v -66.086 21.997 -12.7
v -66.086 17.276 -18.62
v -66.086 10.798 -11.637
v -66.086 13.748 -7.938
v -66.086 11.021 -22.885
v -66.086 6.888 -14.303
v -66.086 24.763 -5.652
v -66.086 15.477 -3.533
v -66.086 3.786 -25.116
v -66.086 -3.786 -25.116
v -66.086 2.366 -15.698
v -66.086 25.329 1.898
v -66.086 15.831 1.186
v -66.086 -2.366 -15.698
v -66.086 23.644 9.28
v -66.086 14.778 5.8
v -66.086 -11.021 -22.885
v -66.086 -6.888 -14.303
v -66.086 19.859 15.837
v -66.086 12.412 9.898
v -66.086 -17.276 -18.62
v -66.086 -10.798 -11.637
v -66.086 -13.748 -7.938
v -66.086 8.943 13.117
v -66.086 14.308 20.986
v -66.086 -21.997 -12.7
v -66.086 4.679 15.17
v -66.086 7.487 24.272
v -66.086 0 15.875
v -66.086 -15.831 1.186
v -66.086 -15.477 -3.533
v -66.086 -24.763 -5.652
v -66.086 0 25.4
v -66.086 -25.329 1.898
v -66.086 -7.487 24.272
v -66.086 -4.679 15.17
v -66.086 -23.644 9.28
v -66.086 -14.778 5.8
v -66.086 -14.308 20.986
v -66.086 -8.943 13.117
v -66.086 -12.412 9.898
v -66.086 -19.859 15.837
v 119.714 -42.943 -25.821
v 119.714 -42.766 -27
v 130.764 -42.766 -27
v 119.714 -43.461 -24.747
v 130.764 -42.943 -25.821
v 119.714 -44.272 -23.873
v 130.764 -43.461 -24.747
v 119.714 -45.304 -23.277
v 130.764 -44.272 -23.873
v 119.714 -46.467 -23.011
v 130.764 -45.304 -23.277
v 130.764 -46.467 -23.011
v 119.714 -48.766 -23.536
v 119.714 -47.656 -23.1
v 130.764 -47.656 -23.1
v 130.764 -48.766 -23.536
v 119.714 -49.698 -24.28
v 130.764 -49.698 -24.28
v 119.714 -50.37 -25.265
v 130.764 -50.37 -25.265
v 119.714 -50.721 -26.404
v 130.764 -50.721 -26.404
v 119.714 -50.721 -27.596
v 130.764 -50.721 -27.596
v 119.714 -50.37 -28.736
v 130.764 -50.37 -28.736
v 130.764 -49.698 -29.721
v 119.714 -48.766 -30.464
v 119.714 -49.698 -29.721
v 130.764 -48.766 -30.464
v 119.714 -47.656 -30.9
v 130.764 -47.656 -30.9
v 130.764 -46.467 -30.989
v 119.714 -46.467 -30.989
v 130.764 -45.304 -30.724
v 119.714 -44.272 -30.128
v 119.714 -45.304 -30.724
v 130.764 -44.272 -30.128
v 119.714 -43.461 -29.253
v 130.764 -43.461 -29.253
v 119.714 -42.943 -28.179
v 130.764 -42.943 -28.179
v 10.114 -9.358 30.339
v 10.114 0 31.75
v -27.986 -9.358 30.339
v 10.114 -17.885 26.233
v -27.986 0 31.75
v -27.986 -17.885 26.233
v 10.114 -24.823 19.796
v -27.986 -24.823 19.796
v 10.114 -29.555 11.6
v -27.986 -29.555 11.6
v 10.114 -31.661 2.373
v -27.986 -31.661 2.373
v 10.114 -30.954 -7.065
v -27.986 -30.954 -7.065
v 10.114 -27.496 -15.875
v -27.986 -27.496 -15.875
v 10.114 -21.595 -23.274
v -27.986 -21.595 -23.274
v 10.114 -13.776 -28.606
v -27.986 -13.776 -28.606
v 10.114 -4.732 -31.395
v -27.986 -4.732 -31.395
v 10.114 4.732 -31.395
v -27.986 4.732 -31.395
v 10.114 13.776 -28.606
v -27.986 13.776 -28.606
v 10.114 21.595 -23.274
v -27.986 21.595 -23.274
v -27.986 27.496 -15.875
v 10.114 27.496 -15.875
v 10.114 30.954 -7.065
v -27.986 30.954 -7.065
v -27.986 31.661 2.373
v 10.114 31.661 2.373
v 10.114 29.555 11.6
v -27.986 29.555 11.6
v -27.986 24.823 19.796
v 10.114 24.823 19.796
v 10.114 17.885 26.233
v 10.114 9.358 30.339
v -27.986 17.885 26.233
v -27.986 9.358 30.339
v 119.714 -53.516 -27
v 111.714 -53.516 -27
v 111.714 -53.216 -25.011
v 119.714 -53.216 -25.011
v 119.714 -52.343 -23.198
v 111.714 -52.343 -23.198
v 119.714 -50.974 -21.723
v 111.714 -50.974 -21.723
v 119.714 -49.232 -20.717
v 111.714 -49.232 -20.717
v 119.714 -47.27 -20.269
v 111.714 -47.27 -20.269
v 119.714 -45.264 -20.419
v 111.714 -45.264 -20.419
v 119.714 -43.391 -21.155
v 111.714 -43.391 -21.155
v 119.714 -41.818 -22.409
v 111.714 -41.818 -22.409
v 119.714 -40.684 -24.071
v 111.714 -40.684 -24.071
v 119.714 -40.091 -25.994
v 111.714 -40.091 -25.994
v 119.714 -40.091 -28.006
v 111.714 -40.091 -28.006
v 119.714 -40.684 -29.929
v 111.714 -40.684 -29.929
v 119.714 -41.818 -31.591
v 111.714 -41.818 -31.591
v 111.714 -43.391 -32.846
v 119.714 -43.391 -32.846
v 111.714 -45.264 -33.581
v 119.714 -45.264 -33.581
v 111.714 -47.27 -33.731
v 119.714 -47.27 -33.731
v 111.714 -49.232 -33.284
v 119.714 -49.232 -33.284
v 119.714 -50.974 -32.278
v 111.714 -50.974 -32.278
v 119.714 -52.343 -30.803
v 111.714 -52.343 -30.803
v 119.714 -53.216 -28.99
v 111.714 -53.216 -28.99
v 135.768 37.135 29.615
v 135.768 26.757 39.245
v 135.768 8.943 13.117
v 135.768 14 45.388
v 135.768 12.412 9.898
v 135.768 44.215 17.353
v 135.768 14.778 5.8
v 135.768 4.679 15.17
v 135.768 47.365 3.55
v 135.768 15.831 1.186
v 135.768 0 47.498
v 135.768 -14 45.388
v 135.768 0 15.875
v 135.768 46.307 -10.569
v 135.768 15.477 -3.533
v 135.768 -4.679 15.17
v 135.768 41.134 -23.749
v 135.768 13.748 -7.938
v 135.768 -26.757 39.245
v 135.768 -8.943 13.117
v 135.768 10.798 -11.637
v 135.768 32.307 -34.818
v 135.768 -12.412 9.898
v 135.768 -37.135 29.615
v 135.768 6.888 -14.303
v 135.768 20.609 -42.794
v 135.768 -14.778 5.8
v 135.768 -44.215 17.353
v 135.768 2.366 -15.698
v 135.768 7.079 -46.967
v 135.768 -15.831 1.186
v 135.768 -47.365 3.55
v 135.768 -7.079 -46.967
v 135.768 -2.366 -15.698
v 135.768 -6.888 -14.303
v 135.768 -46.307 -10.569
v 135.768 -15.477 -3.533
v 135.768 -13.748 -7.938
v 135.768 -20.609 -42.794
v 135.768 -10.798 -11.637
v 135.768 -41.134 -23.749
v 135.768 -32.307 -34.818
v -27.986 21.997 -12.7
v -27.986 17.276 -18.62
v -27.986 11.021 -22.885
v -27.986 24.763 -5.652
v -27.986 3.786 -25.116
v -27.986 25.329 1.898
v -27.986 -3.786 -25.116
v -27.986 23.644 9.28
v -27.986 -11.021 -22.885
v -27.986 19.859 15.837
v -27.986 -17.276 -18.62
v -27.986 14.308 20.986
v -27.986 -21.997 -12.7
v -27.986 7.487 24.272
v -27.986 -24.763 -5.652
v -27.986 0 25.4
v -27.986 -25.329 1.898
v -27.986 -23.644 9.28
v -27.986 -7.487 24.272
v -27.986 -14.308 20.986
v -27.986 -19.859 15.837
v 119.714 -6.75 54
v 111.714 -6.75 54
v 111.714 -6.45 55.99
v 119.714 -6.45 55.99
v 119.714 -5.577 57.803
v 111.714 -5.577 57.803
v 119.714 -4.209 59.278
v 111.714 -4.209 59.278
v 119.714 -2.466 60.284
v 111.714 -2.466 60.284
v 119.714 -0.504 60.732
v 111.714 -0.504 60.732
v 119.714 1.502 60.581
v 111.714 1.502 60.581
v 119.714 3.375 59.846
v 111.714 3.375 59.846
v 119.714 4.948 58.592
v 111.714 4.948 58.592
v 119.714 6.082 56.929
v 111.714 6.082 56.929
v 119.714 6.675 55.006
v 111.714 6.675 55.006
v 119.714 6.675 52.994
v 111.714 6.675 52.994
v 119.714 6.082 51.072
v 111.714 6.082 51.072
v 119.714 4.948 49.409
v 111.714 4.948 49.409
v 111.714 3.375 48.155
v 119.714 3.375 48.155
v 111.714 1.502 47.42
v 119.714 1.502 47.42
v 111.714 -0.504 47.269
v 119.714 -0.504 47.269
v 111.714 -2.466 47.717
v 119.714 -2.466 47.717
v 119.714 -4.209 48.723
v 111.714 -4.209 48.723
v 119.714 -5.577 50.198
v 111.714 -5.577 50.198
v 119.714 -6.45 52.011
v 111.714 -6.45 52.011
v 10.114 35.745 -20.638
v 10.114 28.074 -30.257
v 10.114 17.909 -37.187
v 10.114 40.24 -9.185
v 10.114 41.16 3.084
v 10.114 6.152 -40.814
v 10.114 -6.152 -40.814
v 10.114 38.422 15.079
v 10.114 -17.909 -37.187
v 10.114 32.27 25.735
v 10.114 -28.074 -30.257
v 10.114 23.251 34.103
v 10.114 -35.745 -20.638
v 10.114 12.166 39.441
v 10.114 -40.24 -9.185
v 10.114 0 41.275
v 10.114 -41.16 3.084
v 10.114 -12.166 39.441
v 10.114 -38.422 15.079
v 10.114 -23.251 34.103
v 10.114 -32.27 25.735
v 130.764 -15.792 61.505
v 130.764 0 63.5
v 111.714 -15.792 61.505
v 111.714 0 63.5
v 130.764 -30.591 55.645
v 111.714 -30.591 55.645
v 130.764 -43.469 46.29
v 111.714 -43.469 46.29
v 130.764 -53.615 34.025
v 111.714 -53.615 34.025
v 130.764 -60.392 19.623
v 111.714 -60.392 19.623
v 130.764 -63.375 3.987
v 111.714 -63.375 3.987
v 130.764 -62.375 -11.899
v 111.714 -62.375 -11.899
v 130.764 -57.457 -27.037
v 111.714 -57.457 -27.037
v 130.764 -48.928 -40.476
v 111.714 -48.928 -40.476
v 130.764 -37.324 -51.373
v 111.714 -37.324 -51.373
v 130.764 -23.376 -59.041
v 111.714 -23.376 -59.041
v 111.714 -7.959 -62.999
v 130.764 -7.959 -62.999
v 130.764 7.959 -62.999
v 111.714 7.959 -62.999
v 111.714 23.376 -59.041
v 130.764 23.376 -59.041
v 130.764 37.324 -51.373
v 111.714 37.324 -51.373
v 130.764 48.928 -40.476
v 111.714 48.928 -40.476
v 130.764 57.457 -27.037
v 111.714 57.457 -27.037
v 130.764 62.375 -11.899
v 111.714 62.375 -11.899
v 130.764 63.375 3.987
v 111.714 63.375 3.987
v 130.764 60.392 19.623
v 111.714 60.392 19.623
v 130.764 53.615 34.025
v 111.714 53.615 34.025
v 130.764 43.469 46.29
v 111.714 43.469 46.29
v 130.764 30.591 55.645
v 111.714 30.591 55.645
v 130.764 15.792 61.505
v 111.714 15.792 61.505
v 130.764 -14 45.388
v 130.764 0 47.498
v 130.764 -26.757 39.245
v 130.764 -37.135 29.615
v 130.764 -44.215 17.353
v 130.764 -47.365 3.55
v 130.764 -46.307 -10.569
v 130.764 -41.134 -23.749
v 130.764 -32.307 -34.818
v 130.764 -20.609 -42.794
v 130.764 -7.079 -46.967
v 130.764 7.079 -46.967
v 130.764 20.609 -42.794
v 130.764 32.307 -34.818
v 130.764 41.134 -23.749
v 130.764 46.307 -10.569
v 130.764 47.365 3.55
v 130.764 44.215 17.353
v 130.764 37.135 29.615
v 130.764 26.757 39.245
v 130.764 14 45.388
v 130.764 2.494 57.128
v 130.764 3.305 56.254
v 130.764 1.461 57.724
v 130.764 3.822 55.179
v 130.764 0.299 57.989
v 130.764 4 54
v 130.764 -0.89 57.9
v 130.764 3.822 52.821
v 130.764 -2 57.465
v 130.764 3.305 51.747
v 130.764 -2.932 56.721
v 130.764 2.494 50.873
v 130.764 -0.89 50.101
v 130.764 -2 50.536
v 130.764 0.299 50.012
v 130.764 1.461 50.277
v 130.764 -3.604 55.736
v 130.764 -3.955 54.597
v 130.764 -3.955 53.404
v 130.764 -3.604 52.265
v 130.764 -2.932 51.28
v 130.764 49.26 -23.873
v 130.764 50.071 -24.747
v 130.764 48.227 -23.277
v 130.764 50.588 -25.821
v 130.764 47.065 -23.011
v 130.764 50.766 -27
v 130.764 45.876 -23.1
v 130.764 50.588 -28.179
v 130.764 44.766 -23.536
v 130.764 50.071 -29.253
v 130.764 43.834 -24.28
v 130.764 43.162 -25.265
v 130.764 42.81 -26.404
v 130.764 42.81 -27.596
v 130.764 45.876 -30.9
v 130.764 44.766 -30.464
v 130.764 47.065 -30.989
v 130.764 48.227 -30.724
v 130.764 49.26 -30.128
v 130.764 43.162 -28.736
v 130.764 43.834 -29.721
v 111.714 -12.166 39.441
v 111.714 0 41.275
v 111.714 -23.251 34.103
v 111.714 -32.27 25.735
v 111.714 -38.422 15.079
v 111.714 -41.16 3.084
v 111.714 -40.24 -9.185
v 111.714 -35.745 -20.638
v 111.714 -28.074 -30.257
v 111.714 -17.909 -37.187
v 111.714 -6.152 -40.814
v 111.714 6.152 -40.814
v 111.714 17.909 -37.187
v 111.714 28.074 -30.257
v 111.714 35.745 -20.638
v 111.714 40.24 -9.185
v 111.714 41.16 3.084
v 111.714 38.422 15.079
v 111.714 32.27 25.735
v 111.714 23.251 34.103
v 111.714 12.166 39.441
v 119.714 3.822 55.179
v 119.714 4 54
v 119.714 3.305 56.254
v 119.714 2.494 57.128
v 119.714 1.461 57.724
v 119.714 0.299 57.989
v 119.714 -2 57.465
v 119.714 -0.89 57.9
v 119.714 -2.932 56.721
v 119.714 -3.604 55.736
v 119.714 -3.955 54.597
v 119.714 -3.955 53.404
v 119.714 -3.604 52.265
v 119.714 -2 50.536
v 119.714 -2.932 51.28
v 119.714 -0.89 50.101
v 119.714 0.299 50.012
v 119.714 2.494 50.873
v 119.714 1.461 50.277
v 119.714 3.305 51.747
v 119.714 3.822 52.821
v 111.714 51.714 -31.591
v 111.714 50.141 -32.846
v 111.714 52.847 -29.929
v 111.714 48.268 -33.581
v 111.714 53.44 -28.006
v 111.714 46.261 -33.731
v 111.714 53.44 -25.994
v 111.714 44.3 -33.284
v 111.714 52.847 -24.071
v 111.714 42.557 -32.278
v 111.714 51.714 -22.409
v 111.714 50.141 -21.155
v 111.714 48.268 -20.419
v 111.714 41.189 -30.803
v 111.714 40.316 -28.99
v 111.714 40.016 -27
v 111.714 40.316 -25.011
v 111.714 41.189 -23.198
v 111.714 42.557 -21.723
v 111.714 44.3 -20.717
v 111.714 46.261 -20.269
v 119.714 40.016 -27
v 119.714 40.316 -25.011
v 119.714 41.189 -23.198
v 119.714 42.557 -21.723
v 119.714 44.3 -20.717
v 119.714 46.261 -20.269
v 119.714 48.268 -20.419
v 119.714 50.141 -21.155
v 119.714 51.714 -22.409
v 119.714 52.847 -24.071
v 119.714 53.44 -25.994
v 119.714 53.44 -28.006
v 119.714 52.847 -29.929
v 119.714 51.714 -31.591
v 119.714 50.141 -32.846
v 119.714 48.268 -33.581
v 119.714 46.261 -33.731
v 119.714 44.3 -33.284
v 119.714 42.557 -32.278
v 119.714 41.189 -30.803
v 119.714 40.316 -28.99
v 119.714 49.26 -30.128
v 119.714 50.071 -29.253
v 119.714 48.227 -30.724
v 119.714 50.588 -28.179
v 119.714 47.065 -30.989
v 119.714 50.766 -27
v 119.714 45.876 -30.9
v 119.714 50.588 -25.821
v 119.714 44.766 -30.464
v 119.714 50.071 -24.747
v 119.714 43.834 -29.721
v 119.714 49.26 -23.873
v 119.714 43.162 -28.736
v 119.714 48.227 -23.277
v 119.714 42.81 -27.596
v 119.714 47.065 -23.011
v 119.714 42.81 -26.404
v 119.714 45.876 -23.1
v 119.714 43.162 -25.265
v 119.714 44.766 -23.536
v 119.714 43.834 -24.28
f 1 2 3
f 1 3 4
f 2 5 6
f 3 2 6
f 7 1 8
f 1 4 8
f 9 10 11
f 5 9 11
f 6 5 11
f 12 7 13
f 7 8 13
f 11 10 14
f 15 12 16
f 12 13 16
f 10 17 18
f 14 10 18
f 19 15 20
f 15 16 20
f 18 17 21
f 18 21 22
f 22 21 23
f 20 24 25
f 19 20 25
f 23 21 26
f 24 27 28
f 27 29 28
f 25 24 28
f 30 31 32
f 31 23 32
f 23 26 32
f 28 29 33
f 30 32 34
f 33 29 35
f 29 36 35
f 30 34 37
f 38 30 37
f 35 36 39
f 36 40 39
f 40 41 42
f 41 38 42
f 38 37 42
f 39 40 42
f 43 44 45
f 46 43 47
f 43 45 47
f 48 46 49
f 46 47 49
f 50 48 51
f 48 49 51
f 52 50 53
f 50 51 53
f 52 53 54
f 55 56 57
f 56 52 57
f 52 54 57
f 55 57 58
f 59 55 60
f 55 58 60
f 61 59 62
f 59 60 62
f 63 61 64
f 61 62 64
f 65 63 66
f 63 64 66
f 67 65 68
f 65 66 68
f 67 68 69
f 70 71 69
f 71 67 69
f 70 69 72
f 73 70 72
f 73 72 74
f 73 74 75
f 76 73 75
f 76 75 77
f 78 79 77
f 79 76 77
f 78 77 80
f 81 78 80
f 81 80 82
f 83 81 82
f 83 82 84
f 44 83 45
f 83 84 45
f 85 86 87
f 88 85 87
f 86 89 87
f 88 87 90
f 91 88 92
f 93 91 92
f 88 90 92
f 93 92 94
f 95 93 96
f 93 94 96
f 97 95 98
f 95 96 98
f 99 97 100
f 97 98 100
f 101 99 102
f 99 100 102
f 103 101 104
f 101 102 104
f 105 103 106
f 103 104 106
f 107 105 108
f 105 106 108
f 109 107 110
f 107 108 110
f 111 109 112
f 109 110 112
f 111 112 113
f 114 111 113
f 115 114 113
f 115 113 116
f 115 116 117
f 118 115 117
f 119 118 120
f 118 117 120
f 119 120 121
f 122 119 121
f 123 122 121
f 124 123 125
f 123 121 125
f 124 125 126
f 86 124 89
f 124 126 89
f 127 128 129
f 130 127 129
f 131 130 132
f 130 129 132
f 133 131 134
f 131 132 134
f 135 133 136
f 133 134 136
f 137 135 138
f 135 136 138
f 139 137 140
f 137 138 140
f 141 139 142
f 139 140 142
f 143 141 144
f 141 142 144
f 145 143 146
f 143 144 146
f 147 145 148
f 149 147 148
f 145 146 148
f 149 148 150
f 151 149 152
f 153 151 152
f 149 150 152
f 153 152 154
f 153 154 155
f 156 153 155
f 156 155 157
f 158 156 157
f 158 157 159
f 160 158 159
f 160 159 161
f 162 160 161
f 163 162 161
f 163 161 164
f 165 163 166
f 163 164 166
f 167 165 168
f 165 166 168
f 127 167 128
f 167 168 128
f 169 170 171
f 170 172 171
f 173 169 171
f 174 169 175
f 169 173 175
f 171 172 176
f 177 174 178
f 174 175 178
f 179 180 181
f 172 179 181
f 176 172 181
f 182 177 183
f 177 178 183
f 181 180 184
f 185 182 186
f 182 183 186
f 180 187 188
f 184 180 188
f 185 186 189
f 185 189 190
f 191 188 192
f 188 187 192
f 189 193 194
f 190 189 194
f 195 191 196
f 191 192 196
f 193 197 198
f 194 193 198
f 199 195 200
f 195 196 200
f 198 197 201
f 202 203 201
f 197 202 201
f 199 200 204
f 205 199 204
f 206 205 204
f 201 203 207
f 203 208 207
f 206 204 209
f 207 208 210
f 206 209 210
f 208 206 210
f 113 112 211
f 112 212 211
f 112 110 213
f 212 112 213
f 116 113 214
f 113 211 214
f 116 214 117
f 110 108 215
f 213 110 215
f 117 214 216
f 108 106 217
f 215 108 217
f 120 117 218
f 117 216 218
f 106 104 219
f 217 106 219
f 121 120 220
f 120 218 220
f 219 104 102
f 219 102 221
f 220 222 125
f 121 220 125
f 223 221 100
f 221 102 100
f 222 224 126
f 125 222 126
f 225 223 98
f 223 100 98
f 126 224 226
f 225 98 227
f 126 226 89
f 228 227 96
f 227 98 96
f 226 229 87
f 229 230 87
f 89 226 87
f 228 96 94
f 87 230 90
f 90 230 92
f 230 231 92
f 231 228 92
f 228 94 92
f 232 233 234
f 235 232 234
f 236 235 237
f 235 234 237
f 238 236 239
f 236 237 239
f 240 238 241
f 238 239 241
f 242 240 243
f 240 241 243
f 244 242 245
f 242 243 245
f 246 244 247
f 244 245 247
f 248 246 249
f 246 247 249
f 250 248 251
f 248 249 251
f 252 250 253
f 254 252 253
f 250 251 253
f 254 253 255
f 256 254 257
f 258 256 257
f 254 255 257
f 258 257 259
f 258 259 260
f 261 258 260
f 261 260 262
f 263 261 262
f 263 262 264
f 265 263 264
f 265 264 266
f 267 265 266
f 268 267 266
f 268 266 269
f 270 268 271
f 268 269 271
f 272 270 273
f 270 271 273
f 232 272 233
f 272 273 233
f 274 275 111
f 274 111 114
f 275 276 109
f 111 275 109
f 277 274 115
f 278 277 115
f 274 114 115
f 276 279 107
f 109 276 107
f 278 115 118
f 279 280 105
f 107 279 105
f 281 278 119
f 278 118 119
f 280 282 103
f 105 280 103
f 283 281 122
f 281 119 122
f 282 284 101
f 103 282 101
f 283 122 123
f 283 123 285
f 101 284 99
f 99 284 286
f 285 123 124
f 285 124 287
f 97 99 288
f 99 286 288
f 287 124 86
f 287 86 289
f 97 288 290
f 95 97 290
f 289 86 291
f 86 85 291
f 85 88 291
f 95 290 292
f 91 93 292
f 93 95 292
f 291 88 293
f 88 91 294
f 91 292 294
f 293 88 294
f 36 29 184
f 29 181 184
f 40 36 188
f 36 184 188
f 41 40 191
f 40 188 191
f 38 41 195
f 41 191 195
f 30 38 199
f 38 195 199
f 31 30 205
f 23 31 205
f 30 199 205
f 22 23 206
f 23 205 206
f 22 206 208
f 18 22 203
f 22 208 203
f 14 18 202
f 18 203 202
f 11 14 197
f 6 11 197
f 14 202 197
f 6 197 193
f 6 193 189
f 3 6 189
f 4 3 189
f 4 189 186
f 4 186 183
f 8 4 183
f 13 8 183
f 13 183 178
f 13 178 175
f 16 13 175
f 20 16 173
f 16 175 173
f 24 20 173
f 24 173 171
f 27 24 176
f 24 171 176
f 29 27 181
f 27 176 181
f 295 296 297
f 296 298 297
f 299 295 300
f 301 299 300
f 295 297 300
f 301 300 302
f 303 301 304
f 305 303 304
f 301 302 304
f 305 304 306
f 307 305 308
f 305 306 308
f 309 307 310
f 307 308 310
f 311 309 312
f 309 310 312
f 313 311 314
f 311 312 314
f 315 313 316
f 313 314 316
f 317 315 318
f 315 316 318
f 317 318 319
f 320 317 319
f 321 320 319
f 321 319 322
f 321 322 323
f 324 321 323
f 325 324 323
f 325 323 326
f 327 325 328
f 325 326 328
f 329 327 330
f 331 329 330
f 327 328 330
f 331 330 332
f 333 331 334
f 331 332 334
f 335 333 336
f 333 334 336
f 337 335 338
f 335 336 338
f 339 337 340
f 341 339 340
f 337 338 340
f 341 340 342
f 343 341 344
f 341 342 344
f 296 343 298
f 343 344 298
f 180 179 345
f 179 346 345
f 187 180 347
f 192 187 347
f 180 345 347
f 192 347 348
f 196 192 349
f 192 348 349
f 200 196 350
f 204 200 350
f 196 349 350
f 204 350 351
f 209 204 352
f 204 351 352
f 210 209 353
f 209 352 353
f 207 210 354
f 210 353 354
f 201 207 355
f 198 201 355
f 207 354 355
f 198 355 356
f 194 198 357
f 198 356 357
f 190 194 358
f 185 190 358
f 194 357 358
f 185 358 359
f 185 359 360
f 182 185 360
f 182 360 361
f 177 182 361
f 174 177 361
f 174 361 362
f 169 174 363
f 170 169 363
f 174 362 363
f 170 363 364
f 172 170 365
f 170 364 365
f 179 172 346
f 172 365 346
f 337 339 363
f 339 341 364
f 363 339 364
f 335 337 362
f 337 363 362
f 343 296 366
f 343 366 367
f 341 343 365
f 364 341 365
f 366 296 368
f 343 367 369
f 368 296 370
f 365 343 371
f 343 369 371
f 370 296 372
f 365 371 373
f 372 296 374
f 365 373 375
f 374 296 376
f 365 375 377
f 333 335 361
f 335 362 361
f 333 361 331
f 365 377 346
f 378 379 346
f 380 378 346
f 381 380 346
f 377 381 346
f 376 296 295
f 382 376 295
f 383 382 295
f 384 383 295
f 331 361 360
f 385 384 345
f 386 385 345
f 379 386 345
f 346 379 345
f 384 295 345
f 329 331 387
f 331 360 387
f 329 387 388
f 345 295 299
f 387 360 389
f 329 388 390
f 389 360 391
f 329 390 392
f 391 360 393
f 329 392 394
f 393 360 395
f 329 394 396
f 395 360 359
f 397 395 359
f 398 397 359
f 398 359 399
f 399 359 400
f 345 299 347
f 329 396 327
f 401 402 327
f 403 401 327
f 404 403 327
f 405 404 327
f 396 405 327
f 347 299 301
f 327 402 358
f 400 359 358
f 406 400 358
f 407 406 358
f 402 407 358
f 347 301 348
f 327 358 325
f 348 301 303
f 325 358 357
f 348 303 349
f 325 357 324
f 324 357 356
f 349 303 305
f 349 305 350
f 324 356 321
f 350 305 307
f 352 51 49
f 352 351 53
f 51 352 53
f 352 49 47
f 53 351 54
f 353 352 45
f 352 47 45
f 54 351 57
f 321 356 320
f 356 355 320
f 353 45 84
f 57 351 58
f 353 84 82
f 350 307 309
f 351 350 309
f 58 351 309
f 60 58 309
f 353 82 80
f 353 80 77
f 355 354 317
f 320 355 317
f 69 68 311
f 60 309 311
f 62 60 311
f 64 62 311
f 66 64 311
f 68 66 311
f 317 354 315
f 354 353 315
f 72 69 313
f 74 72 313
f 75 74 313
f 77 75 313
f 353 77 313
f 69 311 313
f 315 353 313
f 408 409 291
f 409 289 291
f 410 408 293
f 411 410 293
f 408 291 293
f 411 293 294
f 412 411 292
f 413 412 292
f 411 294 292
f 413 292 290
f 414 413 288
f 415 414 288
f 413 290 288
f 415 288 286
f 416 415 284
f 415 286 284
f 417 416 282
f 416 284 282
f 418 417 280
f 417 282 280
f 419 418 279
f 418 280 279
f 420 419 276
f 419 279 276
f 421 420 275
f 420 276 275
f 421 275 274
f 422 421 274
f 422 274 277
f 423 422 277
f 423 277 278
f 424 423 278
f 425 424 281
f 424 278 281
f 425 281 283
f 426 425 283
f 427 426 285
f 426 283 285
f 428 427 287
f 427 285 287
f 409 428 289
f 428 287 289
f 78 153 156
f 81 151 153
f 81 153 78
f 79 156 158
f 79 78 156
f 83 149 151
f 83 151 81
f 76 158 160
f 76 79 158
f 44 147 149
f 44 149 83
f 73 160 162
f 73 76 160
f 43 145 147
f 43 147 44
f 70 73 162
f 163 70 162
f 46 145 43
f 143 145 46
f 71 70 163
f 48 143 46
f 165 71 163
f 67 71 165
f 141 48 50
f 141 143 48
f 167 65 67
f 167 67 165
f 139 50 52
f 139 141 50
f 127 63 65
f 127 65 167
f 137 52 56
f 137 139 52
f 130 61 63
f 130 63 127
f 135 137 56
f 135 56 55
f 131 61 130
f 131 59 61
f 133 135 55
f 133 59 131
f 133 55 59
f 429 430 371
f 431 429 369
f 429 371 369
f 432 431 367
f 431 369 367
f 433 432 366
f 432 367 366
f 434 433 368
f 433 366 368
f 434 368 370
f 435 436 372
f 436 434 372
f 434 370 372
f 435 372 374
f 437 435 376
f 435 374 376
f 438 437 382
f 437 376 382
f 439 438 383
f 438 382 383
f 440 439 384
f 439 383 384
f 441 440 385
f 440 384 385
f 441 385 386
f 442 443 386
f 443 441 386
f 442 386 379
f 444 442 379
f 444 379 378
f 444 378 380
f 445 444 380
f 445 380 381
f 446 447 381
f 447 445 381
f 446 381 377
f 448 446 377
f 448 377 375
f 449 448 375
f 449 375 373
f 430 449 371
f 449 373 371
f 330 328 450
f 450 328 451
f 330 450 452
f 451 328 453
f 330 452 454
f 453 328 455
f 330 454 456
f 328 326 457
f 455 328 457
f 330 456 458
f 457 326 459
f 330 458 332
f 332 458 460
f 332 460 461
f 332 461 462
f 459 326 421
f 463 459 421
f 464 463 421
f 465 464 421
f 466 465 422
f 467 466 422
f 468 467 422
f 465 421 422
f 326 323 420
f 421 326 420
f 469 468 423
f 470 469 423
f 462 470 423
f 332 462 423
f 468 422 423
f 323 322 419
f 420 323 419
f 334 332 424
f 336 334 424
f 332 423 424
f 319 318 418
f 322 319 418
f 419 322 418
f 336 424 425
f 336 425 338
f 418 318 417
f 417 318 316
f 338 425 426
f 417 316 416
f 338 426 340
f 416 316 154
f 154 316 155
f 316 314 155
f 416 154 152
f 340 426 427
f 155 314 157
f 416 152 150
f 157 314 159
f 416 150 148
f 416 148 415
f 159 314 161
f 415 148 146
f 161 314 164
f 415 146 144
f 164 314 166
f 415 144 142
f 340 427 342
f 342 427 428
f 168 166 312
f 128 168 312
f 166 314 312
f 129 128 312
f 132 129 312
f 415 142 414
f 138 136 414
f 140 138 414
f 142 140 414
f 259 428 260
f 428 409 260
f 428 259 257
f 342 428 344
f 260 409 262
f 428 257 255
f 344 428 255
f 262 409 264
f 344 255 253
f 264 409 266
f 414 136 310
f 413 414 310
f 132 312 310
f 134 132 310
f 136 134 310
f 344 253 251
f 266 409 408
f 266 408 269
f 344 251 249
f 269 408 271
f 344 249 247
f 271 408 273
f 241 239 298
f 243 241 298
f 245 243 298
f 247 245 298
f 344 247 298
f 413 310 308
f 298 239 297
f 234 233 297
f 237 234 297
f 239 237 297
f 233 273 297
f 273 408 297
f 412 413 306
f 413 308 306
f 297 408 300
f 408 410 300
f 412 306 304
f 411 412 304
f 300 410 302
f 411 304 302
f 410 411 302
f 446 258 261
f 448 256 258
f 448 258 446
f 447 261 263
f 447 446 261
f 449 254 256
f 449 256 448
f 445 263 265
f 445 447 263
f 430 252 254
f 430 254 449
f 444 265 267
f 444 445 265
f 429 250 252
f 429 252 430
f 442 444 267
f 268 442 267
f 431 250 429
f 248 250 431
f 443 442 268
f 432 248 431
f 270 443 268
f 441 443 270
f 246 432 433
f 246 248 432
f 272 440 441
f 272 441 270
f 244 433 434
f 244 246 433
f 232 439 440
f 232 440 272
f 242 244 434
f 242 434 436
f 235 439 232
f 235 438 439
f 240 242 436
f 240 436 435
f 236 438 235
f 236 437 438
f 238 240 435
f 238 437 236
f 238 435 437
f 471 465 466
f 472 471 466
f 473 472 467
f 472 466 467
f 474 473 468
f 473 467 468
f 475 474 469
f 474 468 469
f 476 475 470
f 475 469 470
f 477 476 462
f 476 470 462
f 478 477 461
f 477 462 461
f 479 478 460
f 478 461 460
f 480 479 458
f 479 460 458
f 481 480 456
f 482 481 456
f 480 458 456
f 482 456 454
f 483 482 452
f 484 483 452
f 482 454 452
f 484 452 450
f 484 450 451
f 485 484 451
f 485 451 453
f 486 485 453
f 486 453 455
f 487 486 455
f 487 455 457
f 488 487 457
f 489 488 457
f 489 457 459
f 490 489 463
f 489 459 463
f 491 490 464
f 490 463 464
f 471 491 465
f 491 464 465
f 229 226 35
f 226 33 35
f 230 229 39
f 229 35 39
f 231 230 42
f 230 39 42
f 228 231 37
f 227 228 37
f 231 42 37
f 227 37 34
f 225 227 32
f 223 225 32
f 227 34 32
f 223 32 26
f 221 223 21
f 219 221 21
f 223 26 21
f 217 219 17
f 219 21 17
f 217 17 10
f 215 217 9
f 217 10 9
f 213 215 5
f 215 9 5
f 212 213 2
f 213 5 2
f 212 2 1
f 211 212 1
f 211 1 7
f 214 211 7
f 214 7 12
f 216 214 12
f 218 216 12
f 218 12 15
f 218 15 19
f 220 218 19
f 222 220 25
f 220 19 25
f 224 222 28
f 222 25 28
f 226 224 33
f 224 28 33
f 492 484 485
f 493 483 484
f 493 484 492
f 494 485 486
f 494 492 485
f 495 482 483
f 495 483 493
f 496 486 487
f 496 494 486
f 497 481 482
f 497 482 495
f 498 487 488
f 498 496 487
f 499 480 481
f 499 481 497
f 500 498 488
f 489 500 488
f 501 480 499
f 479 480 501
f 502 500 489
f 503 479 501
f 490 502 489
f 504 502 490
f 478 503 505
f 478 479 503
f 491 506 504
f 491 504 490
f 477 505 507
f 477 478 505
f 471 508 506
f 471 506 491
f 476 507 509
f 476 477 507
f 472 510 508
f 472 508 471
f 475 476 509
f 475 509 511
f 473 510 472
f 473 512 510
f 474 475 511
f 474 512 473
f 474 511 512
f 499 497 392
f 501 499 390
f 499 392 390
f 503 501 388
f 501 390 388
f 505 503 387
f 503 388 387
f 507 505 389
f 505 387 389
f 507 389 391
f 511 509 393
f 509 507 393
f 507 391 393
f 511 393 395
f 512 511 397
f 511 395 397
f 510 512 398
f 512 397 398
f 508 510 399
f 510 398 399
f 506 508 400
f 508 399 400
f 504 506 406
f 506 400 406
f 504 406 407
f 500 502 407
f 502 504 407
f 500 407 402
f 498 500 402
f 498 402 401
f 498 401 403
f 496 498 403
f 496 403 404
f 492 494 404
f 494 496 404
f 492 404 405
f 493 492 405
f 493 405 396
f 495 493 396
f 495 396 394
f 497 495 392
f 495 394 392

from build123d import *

# Parameters (mm, degrees)
F2_R     = 4
F3_DEPTH = 25.4
F4_R     = 6.75
F4_R_2   = 4
F5_DEPTH = 8


with BuildPart() as f1:
    # F0 (on Front) → F1 (revolve)
    with BuildSketch(Plane.XZ):
        Polygon((-47.183853, 15.875), (10.1137, 15.875), (130.7637, 15.875), (135.7675, 15.875), (135.7675, 47.498), (130.7637, 47.498), (130.7637, 63.5), (111.7137, 63.5), (111.7137, 41.275), (10.1137, 41.275), (10.1137, 31.75), (-27.9863, 31.75), (-27.9863, 25.4), (-66.0863, 25.4), (-66.0863, 15.875), align=None)
    revolve(axis=Axis((0.887014, 0, 0), (1, 0, 0)))

    # F2 (on face) → F3 (cut)
    with BuildSketch(Plane.YZ.offset(130.7637)):
        with Locations((0, 54.0004)):
            Circle(F2_R)
        with Locations((46.765718, -27.0002)):
            Circle(F2_R)
        with Locations((-46.765718, -27.0002)):
            Circle(F2_R)
    extrude(amount=-F3_DEPTH, mode=Mode.SUBTRACT)

    # F4 (on face) → F5 (cut)
    with BuildSketch(Plane(origin=(111.7137, 0, 0), x_dir=(0, -1, 0), z_dir=(-1, 0, 0))):
        with Locations((0, 54.0004)):
            Circle(F4_R)
        with Locations((0, 54.0004)):
            Circle(F4_R_2, mode=Mode.SUBTRACT)
        with Locations((46.765718, -27.0002)):
            Circle(F4_R)
        with Locations((46.765718, -27.0002)):
            Circle(F4_R_2, mode=Mode.SUBTRACT)
        with Locations((-46.765718, -27.0002)):
            Circle(F4_R)
        with Locations((-46.765718, -27.0002)):
            Circle(F4_R_2, mode=Mode.SUBTRACT)
    extrude(amount=-F5_DEPTH, mode=Mode.SUBTRACT)


solid = f1.part
